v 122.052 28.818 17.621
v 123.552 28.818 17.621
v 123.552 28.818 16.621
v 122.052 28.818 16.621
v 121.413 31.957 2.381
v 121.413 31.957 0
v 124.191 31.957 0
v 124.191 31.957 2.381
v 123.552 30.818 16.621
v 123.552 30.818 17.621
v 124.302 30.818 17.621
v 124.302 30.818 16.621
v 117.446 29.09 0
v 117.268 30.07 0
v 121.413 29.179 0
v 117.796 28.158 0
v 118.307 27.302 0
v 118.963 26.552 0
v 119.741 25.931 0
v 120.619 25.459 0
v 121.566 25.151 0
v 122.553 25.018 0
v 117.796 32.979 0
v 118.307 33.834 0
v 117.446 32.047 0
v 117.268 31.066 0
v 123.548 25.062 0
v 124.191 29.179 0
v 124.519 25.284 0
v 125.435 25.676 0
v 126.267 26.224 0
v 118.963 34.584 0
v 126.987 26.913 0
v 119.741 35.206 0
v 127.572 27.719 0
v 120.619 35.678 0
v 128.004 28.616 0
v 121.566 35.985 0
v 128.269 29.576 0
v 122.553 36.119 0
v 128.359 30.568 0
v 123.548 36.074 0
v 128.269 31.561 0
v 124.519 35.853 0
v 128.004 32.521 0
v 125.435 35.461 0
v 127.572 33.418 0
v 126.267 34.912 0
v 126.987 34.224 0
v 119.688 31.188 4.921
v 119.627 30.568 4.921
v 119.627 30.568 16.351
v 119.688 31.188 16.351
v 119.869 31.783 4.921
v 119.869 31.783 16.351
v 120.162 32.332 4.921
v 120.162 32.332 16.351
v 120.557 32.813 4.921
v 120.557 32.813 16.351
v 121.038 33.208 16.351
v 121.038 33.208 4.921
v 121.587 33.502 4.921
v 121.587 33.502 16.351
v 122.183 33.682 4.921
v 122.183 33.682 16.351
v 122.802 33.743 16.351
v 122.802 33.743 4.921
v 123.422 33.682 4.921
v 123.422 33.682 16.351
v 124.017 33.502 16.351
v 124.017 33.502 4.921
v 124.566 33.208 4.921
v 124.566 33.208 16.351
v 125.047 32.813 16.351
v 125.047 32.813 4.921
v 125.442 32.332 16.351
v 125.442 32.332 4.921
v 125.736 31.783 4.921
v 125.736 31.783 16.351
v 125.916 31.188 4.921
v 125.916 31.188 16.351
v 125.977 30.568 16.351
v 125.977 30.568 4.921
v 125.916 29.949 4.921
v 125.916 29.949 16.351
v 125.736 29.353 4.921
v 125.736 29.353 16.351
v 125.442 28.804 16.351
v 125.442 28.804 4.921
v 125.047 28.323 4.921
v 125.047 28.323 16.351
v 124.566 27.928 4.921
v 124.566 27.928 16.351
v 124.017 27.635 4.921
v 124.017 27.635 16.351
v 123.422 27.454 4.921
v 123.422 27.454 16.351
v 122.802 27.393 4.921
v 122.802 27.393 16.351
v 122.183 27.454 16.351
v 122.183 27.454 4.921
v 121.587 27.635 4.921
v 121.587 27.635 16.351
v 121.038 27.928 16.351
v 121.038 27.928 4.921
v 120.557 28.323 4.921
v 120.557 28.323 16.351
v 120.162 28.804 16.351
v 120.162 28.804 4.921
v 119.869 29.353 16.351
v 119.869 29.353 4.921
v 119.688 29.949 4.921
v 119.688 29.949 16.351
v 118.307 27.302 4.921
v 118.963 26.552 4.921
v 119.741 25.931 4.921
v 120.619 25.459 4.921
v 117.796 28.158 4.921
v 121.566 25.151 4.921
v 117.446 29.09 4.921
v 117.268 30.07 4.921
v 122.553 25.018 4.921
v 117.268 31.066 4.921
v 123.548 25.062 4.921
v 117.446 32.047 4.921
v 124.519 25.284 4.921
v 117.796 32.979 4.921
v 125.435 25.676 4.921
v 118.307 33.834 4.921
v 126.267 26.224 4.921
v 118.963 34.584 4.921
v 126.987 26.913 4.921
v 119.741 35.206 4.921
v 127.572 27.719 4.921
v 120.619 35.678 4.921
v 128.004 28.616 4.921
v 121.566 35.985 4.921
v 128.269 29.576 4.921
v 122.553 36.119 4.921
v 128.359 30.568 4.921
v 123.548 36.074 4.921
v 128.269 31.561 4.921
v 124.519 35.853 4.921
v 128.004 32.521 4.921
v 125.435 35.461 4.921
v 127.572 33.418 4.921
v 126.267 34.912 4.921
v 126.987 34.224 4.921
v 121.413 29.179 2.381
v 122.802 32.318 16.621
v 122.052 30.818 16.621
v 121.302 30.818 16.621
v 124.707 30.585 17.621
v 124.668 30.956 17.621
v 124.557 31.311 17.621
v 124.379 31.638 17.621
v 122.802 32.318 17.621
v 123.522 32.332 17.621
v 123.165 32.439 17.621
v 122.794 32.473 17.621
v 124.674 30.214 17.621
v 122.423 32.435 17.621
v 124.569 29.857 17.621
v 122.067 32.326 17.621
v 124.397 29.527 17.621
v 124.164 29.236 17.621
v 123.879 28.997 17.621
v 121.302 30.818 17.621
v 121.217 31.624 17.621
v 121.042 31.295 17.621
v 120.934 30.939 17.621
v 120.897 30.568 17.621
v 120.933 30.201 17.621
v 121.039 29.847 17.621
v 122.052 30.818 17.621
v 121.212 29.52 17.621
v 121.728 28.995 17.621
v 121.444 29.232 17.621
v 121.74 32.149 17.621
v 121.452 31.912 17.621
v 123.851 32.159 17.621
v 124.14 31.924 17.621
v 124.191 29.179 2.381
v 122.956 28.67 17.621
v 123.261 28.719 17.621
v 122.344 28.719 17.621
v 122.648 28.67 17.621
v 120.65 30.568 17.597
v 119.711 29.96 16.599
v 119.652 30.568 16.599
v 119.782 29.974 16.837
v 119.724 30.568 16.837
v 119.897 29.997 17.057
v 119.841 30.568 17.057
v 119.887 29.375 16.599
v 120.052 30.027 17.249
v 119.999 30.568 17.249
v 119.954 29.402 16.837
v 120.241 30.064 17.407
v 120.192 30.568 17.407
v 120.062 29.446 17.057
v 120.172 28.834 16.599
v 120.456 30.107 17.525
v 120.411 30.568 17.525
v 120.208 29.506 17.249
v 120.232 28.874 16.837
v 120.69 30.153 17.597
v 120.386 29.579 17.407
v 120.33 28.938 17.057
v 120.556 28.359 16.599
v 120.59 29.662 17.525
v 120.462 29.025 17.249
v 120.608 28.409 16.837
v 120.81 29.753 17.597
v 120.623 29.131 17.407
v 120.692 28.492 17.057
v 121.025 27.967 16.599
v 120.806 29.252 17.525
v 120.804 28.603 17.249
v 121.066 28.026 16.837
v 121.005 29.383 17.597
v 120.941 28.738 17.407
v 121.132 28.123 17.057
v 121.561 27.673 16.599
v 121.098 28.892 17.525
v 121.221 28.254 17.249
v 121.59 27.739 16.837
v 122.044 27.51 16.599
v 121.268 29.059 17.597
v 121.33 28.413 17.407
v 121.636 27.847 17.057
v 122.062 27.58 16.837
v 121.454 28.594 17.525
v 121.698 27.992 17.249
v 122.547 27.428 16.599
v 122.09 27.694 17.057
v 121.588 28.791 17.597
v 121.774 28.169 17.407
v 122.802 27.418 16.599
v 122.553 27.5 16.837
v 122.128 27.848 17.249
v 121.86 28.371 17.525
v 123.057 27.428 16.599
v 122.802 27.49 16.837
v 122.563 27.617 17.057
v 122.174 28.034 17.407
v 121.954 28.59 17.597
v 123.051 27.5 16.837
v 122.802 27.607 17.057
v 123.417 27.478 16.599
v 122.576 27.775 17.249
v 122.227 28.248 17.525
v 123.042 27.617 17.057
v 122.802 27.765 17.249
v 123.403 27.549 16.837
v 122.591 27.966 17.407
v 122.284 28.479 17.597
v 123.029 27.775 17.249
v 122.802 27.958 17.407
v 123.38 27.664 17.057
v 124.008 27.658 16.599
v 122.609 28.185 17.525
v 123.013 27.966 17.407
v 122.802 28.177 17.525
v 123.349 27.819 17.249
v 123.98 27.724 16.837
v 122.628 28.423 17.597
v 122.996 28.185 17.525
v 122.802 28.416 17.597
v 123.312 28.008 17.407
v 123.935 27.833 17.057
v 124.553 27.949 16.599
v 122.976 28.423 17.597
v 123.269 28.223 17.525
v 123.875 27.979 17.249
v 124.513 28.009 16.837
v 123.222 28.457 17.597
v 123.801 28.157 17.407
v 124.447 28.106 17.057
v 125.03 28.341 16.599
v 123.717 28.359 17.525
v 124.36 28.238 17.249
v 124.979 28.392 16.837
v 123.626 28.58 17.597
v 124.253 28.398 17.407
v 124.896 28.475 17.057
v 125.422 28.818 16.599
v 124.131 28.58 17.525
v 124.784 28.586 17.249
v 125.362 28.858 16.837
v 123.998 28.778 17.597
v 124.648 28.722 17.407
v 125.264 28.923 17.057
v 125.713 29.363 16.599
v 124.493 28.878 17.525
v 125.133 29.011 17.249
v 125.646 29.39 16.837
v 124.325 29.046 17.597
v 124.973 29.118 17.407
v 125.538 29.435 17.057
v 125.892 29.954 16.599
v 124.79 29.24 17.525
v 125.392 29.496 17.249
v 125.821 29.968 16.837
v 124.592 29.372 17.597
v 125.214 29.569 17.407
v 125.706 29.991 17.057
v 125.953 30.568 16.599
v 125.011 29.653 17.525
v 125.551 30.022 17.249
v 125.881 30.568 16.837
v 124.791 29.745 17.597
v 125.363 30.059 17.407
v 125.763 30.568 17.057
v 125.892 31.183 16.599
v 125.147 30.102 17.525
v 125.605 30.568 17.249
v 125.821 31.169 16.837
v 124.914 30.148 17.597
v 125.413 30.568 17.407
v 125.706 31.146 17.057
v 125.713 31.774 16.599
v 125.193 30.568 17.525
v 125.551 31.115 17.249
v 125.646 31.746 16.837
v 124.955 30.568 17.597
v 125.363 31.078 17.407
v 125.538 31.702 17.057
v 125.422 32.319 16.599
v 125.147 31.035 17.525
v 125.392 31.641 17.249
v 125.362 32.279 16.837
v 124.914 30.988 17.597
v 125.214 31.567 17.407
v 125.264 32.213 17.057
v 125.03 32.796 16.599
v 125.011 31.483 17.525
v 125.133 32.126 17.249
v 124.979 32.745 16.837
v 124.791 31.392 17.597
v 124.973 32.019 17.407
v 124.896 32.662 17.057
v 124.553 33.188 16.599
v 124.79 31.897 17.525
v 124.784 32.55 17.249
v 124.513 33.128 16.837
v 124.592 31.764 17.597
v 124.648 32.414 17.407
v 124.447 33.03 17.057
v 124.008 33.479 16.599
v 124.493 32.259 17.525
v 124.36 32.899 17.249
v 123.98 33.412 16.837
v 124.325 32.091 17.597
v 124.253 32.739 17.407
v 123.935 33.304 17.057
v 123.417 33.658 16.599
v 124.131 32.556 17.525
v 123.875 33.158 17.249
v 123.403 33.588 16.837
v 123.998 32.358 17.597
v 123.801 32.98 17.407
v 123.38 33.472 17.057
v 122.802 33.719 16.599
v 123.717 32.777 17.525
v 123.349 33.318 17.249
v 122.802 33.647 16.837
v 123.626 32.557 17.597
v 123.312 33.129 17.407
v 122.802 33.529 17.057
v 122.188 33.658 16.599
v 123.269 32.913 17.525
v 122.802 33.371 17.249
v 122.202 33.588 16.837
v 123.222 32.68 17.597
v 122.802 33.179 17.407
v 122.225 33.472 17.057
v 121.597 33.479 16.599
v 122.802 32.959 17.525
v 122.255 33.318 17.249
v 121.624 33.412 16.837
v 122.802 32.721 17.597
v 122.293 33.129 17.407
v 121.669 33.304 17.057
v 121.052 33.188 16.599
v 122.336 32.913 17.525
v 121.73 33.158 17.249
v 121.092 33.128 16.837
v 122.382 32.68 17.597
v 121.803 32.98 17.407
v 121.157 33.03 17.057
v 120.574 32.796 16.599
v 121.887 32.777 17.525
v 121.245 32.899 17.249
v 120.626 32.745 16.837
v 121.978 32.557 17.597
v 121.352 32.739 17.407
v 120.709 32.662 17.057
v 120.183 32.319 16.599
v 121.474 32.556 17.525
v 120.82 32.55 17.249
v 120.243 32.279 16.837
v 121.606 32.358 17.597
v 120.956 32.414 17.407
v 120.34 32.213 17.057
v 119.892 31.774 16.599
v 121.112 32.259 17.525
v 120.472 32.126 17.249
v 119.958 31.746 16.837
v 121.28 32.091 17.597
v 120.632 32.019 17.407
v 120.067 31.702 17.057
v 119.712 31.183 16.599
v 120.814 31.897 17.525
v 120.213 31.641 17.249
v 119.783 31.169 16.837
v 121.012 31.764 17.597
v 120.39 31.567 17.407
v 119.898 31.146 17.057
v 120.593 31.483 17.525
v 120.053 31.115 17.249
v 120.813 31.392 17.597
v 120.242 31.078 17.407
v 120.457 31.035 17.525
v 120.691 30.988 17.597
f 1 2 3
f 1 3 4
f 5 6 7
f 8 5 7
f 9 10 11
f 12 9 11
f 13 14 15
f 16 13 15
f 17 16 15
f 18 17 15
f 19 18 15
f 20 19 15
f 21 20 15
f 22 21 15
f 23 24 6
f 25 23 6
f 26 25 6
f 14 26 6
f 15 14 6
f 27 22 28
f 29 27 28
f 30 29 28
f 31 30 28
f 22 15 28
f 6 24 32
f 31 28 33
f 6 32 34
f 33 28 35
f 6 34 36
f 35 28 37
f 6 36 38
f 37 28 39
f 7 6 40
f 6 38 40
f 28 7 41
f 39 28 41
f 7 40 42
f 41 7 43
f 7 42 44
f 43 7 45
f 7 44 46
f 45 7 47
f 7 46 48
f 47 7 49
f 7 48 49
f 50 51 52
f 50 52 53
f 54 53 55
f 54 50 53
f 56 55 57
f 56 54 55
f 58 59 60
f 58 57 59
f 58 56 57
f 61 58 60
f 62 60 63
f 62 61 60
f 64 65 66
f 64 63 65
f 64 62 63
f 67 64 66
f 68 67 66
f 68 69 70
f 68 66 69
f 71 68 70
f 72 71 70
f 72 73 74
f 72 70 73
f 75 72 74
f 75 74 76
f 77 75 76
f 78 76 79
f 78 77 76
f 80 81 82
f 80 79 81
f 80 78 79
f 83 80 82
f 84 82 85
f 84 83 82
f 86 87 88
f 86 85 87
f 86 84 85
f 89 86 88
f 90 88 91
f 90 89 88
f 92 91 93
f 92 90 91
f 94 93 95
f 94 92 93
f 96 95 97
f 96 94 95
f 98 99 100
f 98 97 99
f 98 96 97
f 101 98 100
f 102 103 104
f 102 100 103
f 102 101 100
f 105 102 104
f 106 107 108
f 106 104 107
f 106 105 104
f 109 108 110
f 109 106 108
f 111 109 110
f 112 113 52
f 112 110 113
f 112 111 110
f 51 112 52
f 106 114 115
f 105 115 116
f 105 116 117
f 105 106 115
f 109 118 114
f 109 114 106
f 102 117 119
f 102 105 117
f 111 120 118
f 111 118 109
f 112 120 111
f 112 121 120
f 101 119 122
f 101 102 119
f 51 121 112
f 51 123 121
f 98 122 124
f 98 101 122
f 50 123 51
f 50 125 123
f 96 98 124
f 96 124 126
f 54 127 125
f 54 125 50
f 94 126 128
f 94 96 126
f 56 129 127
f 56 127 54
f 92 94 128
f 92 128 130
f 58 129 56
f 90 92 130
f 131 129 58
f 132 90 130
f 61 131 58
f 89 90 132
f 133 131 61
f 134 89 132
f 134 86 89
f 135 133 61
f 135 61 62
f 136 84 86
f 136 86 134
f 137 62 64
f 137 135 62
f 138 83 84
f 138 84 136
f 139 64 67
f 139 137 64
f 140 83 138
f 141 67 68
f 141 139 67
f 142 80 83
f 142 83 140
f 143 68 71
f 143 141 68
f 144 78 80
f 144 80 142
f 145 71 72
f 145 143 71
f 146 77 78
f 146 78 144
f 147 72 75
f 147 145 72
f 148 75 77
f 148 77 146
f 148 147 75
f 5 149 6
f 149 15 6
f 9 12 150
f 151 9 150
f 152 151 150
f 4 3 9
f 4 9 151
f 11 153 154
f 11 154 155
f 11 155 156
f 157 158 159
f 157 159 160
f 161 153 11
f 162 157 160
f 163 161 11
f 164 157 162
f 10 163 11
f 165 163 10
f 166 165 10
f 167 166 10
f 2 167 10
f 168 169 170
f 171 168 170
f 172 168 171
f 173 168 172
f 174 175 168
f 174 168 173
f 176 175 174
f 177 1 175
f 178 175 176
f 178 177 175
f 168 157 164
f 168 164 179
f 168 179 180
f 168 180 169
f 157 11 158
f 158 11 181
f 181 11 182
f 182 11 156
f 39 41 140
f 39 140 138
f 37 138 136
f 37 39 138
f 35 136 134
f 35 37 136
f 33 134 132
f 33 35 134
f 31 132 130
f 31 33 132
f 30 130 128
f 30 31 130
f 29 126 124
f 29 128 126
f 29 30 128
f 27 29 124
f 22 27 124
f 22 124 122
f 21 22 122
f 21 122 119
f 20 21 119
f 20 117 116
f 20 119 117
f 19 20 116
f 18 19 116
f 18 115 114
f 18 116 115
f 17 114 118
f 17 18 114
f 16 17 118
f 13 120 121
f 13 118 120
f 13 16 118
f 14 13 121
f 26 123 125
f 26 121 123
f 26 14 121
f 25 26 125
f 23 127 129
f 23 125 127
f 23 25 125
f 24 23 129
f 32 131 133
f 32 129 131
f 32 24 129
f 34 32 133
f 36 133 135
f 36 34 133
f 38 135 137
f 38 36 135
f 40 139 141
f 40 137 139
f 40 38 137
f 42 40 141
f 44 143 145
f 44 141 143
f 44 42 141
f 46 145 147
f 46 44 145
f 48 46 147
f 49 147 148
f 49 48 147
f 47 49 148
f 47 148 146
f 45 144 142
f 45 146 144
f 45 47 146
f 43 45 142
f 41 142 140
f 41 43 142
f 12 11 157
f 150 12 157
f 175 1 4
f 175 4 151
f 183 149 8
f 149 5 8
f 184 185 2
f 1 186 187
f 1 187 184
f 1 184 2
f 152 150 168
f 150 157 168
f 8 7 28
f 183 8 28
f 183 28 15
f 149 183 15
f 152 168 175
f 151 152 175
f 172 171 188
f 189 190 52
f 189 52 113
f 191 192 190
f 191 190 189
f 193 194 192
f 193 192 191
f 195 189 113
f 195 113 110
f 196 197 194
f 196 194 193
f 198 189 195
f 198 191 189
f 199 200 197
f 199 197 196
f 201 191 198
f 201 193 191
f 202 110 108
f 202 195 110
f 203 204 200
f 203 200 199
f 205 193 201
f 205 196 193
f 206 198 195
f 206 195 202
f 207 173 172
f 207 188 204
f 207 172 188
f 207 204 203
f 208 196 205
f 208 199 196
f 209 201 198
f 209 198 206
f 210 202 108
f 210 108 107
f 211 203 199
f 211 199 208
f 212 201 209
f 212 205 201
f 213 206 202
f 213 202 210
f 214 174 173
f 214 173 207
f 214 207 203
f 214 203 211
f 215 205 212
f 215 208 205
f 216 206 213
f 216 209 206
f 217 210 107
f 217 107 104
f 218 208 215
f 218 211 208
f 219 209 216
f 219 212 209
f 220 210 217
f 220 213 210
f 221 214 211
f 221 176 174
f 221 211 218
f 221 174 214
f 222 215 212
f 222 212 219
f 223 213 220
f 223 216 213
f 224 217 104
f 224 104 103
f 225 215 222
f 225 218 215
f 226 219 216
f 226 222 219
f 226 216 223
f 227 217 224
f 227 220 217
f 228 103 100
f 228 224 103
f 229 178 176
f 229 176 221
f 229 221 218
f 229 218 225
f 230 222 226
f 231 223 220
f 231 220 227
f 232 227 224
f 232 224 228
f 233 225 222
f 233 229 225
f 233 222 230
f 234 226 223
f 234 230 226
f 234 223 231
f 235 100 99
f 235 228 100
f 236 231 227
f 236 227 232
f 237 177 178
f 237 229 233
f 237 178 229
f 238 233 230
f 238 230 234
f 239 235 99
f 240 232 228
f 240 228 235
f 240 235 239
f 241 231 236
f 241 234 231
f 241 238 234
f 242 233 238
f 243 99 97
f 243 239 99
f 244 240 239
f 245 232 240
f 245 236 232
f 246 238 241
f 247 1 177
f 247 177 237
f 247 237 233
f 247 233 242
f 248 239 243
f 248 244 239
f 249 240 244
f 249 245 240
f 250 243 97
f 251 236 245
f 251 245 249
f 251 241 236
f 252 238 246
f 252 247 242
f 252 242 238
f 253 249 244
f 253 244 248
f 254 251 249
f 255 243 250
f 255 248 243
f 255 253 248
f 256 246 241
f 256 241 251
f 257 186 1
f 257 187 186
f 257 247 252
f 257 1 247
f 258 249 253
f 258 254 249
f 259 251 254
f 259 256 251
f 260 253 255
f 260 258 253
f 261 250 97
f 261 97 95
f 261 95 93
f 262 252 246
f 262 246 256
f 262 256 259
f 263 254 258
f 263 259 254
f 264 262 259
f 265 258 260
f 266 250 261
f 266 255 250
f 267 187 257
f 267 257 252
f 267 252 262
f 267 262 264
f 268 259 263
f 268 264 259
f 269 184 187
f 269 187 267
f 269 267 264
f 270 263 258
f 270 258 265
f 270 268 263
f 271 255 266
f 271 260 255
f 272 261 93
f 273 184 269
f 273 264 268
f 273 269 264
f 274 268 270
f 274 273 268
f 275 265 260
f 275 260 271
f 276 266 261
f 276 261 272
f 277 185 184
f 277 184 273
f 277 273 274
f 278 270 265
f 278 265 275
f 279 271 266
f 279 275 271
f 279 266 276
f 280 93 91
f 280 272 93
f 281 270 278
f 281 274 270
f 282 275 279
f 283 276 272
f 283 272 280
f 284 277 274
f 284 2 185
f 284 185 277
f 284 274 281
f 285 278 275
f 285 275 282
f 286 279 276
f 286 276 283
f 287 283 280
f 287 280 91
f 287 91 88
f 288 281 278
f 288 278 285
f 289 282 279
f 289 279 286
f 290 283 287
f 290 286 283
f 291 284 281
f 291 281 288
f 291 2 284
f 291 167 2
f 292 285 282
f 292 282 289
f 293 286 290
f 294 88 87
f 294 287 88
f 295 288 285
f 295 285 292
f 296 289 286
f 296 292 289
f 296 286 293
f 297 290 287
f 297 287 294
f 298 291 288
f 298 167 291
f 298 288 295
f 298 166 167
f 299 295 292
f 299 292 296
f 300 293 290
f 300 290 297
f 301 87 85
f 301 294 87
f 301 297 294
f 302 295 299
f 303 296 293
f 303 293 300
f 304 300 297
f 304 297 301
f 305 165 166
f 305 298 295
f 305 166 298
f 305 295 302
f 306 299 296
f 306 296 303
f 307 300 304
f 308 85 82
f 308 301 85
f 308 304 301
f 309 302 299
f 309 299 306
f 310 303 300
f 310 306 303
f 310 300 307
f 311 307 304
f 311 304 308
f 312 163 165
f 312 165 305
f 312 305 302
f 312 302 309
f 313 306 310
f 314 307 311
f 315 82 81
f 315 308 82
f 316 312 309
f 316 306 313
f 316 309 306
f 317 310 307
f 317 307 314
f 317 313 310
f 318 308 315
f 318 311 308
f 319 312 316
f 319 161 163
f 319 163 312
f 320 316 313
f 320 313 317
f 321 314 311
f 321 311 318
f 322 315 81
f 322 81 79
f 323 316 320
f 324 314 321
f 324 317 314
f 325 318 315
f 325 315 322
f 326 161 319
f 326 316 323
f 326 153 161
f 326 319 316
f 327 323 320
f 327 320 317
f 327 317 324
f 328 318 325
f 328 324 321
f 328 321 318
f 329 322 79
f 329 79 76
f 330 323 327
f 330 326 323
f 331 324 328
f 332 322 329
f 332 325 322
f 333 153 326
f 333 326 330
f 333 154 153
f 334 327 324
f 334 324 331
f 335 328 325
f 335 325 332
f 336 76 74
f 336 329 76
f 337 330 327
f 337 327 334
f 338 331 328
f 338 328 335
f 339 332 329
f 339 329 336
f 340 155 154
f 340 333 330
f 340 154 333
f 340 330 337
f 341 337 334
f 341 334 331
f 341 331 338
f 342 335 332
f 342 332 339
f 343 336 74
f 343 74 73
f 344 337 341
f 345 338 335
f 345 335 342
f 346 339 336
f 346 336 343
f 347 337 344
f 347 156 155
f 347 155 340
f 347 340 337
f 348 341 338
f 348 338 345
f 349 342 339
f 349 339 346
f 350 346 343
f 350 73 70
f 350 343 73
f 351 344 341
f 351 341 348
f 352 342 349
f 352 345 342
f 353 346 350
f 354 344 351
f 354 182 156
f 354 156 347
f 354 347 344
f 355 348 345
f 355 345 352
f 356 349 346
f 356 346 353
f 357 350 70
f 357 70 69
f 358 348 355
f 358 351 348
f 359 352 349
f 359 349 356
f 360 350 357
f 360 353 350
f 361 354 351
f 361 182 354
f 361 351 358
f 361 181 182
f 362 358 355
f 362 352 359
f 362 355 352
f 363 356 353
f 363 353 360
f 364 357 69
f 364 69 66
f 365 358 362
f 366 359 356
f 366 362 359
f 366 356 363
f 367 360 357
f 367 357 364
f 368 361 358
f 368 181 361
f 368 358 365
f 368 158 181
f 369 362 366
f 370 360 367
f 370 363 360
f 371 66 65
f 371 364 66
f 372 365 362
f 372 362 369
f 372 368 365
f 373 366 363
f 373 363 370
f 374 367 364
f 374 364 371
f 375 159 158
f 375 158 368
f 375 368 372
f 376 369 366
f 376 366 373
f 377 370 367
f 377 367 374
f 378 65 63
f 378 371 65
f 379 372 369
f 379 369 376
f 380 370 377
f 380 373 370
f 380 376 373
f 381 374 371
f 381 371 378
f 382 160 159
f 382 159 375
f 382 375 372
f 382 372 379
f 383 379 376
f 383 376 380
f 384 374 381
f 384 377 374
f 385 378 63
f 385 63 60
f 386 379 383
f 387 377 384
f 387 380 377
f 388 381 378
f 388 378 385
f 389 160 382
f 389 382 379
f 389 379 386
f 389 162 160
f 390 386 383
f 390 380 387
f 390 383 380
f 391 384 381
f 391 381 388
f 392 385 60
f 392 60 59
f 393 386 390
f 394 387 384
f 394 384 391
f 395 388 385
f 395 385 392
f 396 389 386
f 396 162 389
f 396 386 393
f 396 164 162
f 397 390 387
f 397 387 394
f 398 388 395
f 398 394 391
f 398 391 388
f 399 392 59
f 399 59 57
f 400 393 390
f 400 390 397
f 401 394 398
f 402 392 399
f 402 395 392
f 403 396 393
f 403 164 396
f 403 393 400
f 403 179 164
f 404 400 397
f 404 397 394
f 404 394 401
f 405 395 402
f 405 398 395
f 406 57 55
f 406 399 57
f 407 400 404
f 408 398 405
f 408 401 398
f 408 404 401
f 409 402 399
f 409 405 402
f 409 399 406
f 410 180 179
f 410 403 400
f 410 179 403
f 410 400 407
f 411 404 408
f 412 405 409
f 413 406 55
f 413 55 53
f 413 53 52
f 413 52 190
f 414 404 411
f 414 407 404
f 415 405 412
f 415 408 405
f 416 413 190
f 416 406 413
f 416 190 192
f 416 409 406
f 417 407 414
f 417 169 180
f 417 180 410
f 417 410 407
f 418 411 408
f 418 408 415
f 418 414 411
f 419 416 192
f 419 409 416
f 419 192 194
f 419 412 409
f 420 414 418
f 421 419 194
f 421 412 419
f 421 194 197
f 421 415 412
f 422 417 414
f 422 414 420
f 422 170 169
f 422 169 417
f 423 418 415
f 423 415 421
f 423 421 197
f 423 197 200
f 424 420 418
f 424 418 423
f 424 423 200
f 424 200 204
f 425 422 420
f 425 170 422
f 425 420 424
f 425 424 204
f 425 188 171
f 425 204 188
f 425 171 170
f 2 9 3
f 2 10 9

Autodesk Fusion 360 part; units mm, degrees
sketch "Sketch1" plane through (0, 0, 0) normal (0, 0, 1) x (1, 0, 0)
  line L0 (121.4132, 31.9574) -> (124.1913, 31.9574)
  line L1 (124.1913, 31.9574) -> (124.1913, 29.1793)
  line L2 (124.1913, 29.1793) -> (121.4132, 29.1793)
  line L3 (121.4132, 29.1793) -> (121.4132, 31.9574)
  circle A0 centre (122.8023, 30.5684) radius 5.5563
  dimension "d1" = 2.7781
  dimension "d2" = 2.7781
  dimension "d17" = 11.1125
extrude "Extrude1" add sketch "Sketch1" along normal blind 2.3813
extrude "Extrude4" add sketch "Sketch1" along normal blind 2.54 from surface at 2.3813 contours L0 L1 L2 L3 | A0
sketch "Sketch2" plane through (0, 0, 4.9213) normal (0, 0, 1) x (-1, 0, 0)
  line L0 (-124.1913, -29.1793) -> (-121.4132, -29.1793)
  line L1 (-121.4132, -29.1793) -> (-121.4132, -31.9574)
  line L2 (-121.4132, -31.9574) -> (-124.1913, -31.9574)
  line L3 (-124.1913, -31.9574) -> (-124.1913, -29.1793)
  circle A0 centre (-122.8023, -30.5684) radius 3.175
  circle A1 centre (-122.8023, -30.5684) radius 5.5562
  circle A2 centre (-122.8023, -30.5684) radius 5.5562
  point P0 (-121.4132, -30.5684)
  point P1 (-122.8023, -31.9574)
  dimension "d6" = 6.35
extrude "Extrude2" add sketch "Sketch2" along normal blind 12.7 contours L0 L1 L2 L3 | A0
fillet "Fillet1" radius 1.27 1 edges at (125.7624, 31.7165, 17.6213)
sketch "Sketch3" plane through (0, 0, 17.6213) normal (0, 0, 1) x (-1, 0, 0)
  circle A0 centre (-122.8023, -30.5684) radius 1.905
  line L0 (-122.0523, -30.8184) -> (-123.5523, -30.8184) construction
  line L1 (-123.5523, -30.8184) -> (-123.5523, -28.8184)
  line L2 (-123.5523, -28.8184) -> (-122.0523, -28.8184)
  line L3 (-122.0523, -28.8184) -> (-122.0523, -30.8184)
  line L4 (-121.3023, -30.8184) -> (-124.3023, -30.8184)
  line L5 (-124.3023, -30.8184) -> (-122.8023, -32.3184)
  line L6 (-122.8023, -32.3184) -> (-121.3023, -30.8184)
  line L7 (-122.8023, -32.3184) -> (-122.8023, -28.8184) construction
  point P0 (-122.8023, -30.8184)
  point P1 (-122.8023, -30.5684)
  dimension "d11" = 1.5
  dimension "d12" = 2
  dimension "d13" = 1.5
  dimension "d14" = 3
extrude "Extrude3" cut sketch "Sketch3" against normal blind 1 contours L1 L2 L3 L4 | L4 L5 L6
equation "d1 = ( 7 / 64 ) * 1 in"
equation "d2 = ( 7 / 64 ) * 1 in"
equation "d4 = ( 3 / 32 ) * 1 in"
equation "d17 = ( 7 / 16 ) * 1 in"
